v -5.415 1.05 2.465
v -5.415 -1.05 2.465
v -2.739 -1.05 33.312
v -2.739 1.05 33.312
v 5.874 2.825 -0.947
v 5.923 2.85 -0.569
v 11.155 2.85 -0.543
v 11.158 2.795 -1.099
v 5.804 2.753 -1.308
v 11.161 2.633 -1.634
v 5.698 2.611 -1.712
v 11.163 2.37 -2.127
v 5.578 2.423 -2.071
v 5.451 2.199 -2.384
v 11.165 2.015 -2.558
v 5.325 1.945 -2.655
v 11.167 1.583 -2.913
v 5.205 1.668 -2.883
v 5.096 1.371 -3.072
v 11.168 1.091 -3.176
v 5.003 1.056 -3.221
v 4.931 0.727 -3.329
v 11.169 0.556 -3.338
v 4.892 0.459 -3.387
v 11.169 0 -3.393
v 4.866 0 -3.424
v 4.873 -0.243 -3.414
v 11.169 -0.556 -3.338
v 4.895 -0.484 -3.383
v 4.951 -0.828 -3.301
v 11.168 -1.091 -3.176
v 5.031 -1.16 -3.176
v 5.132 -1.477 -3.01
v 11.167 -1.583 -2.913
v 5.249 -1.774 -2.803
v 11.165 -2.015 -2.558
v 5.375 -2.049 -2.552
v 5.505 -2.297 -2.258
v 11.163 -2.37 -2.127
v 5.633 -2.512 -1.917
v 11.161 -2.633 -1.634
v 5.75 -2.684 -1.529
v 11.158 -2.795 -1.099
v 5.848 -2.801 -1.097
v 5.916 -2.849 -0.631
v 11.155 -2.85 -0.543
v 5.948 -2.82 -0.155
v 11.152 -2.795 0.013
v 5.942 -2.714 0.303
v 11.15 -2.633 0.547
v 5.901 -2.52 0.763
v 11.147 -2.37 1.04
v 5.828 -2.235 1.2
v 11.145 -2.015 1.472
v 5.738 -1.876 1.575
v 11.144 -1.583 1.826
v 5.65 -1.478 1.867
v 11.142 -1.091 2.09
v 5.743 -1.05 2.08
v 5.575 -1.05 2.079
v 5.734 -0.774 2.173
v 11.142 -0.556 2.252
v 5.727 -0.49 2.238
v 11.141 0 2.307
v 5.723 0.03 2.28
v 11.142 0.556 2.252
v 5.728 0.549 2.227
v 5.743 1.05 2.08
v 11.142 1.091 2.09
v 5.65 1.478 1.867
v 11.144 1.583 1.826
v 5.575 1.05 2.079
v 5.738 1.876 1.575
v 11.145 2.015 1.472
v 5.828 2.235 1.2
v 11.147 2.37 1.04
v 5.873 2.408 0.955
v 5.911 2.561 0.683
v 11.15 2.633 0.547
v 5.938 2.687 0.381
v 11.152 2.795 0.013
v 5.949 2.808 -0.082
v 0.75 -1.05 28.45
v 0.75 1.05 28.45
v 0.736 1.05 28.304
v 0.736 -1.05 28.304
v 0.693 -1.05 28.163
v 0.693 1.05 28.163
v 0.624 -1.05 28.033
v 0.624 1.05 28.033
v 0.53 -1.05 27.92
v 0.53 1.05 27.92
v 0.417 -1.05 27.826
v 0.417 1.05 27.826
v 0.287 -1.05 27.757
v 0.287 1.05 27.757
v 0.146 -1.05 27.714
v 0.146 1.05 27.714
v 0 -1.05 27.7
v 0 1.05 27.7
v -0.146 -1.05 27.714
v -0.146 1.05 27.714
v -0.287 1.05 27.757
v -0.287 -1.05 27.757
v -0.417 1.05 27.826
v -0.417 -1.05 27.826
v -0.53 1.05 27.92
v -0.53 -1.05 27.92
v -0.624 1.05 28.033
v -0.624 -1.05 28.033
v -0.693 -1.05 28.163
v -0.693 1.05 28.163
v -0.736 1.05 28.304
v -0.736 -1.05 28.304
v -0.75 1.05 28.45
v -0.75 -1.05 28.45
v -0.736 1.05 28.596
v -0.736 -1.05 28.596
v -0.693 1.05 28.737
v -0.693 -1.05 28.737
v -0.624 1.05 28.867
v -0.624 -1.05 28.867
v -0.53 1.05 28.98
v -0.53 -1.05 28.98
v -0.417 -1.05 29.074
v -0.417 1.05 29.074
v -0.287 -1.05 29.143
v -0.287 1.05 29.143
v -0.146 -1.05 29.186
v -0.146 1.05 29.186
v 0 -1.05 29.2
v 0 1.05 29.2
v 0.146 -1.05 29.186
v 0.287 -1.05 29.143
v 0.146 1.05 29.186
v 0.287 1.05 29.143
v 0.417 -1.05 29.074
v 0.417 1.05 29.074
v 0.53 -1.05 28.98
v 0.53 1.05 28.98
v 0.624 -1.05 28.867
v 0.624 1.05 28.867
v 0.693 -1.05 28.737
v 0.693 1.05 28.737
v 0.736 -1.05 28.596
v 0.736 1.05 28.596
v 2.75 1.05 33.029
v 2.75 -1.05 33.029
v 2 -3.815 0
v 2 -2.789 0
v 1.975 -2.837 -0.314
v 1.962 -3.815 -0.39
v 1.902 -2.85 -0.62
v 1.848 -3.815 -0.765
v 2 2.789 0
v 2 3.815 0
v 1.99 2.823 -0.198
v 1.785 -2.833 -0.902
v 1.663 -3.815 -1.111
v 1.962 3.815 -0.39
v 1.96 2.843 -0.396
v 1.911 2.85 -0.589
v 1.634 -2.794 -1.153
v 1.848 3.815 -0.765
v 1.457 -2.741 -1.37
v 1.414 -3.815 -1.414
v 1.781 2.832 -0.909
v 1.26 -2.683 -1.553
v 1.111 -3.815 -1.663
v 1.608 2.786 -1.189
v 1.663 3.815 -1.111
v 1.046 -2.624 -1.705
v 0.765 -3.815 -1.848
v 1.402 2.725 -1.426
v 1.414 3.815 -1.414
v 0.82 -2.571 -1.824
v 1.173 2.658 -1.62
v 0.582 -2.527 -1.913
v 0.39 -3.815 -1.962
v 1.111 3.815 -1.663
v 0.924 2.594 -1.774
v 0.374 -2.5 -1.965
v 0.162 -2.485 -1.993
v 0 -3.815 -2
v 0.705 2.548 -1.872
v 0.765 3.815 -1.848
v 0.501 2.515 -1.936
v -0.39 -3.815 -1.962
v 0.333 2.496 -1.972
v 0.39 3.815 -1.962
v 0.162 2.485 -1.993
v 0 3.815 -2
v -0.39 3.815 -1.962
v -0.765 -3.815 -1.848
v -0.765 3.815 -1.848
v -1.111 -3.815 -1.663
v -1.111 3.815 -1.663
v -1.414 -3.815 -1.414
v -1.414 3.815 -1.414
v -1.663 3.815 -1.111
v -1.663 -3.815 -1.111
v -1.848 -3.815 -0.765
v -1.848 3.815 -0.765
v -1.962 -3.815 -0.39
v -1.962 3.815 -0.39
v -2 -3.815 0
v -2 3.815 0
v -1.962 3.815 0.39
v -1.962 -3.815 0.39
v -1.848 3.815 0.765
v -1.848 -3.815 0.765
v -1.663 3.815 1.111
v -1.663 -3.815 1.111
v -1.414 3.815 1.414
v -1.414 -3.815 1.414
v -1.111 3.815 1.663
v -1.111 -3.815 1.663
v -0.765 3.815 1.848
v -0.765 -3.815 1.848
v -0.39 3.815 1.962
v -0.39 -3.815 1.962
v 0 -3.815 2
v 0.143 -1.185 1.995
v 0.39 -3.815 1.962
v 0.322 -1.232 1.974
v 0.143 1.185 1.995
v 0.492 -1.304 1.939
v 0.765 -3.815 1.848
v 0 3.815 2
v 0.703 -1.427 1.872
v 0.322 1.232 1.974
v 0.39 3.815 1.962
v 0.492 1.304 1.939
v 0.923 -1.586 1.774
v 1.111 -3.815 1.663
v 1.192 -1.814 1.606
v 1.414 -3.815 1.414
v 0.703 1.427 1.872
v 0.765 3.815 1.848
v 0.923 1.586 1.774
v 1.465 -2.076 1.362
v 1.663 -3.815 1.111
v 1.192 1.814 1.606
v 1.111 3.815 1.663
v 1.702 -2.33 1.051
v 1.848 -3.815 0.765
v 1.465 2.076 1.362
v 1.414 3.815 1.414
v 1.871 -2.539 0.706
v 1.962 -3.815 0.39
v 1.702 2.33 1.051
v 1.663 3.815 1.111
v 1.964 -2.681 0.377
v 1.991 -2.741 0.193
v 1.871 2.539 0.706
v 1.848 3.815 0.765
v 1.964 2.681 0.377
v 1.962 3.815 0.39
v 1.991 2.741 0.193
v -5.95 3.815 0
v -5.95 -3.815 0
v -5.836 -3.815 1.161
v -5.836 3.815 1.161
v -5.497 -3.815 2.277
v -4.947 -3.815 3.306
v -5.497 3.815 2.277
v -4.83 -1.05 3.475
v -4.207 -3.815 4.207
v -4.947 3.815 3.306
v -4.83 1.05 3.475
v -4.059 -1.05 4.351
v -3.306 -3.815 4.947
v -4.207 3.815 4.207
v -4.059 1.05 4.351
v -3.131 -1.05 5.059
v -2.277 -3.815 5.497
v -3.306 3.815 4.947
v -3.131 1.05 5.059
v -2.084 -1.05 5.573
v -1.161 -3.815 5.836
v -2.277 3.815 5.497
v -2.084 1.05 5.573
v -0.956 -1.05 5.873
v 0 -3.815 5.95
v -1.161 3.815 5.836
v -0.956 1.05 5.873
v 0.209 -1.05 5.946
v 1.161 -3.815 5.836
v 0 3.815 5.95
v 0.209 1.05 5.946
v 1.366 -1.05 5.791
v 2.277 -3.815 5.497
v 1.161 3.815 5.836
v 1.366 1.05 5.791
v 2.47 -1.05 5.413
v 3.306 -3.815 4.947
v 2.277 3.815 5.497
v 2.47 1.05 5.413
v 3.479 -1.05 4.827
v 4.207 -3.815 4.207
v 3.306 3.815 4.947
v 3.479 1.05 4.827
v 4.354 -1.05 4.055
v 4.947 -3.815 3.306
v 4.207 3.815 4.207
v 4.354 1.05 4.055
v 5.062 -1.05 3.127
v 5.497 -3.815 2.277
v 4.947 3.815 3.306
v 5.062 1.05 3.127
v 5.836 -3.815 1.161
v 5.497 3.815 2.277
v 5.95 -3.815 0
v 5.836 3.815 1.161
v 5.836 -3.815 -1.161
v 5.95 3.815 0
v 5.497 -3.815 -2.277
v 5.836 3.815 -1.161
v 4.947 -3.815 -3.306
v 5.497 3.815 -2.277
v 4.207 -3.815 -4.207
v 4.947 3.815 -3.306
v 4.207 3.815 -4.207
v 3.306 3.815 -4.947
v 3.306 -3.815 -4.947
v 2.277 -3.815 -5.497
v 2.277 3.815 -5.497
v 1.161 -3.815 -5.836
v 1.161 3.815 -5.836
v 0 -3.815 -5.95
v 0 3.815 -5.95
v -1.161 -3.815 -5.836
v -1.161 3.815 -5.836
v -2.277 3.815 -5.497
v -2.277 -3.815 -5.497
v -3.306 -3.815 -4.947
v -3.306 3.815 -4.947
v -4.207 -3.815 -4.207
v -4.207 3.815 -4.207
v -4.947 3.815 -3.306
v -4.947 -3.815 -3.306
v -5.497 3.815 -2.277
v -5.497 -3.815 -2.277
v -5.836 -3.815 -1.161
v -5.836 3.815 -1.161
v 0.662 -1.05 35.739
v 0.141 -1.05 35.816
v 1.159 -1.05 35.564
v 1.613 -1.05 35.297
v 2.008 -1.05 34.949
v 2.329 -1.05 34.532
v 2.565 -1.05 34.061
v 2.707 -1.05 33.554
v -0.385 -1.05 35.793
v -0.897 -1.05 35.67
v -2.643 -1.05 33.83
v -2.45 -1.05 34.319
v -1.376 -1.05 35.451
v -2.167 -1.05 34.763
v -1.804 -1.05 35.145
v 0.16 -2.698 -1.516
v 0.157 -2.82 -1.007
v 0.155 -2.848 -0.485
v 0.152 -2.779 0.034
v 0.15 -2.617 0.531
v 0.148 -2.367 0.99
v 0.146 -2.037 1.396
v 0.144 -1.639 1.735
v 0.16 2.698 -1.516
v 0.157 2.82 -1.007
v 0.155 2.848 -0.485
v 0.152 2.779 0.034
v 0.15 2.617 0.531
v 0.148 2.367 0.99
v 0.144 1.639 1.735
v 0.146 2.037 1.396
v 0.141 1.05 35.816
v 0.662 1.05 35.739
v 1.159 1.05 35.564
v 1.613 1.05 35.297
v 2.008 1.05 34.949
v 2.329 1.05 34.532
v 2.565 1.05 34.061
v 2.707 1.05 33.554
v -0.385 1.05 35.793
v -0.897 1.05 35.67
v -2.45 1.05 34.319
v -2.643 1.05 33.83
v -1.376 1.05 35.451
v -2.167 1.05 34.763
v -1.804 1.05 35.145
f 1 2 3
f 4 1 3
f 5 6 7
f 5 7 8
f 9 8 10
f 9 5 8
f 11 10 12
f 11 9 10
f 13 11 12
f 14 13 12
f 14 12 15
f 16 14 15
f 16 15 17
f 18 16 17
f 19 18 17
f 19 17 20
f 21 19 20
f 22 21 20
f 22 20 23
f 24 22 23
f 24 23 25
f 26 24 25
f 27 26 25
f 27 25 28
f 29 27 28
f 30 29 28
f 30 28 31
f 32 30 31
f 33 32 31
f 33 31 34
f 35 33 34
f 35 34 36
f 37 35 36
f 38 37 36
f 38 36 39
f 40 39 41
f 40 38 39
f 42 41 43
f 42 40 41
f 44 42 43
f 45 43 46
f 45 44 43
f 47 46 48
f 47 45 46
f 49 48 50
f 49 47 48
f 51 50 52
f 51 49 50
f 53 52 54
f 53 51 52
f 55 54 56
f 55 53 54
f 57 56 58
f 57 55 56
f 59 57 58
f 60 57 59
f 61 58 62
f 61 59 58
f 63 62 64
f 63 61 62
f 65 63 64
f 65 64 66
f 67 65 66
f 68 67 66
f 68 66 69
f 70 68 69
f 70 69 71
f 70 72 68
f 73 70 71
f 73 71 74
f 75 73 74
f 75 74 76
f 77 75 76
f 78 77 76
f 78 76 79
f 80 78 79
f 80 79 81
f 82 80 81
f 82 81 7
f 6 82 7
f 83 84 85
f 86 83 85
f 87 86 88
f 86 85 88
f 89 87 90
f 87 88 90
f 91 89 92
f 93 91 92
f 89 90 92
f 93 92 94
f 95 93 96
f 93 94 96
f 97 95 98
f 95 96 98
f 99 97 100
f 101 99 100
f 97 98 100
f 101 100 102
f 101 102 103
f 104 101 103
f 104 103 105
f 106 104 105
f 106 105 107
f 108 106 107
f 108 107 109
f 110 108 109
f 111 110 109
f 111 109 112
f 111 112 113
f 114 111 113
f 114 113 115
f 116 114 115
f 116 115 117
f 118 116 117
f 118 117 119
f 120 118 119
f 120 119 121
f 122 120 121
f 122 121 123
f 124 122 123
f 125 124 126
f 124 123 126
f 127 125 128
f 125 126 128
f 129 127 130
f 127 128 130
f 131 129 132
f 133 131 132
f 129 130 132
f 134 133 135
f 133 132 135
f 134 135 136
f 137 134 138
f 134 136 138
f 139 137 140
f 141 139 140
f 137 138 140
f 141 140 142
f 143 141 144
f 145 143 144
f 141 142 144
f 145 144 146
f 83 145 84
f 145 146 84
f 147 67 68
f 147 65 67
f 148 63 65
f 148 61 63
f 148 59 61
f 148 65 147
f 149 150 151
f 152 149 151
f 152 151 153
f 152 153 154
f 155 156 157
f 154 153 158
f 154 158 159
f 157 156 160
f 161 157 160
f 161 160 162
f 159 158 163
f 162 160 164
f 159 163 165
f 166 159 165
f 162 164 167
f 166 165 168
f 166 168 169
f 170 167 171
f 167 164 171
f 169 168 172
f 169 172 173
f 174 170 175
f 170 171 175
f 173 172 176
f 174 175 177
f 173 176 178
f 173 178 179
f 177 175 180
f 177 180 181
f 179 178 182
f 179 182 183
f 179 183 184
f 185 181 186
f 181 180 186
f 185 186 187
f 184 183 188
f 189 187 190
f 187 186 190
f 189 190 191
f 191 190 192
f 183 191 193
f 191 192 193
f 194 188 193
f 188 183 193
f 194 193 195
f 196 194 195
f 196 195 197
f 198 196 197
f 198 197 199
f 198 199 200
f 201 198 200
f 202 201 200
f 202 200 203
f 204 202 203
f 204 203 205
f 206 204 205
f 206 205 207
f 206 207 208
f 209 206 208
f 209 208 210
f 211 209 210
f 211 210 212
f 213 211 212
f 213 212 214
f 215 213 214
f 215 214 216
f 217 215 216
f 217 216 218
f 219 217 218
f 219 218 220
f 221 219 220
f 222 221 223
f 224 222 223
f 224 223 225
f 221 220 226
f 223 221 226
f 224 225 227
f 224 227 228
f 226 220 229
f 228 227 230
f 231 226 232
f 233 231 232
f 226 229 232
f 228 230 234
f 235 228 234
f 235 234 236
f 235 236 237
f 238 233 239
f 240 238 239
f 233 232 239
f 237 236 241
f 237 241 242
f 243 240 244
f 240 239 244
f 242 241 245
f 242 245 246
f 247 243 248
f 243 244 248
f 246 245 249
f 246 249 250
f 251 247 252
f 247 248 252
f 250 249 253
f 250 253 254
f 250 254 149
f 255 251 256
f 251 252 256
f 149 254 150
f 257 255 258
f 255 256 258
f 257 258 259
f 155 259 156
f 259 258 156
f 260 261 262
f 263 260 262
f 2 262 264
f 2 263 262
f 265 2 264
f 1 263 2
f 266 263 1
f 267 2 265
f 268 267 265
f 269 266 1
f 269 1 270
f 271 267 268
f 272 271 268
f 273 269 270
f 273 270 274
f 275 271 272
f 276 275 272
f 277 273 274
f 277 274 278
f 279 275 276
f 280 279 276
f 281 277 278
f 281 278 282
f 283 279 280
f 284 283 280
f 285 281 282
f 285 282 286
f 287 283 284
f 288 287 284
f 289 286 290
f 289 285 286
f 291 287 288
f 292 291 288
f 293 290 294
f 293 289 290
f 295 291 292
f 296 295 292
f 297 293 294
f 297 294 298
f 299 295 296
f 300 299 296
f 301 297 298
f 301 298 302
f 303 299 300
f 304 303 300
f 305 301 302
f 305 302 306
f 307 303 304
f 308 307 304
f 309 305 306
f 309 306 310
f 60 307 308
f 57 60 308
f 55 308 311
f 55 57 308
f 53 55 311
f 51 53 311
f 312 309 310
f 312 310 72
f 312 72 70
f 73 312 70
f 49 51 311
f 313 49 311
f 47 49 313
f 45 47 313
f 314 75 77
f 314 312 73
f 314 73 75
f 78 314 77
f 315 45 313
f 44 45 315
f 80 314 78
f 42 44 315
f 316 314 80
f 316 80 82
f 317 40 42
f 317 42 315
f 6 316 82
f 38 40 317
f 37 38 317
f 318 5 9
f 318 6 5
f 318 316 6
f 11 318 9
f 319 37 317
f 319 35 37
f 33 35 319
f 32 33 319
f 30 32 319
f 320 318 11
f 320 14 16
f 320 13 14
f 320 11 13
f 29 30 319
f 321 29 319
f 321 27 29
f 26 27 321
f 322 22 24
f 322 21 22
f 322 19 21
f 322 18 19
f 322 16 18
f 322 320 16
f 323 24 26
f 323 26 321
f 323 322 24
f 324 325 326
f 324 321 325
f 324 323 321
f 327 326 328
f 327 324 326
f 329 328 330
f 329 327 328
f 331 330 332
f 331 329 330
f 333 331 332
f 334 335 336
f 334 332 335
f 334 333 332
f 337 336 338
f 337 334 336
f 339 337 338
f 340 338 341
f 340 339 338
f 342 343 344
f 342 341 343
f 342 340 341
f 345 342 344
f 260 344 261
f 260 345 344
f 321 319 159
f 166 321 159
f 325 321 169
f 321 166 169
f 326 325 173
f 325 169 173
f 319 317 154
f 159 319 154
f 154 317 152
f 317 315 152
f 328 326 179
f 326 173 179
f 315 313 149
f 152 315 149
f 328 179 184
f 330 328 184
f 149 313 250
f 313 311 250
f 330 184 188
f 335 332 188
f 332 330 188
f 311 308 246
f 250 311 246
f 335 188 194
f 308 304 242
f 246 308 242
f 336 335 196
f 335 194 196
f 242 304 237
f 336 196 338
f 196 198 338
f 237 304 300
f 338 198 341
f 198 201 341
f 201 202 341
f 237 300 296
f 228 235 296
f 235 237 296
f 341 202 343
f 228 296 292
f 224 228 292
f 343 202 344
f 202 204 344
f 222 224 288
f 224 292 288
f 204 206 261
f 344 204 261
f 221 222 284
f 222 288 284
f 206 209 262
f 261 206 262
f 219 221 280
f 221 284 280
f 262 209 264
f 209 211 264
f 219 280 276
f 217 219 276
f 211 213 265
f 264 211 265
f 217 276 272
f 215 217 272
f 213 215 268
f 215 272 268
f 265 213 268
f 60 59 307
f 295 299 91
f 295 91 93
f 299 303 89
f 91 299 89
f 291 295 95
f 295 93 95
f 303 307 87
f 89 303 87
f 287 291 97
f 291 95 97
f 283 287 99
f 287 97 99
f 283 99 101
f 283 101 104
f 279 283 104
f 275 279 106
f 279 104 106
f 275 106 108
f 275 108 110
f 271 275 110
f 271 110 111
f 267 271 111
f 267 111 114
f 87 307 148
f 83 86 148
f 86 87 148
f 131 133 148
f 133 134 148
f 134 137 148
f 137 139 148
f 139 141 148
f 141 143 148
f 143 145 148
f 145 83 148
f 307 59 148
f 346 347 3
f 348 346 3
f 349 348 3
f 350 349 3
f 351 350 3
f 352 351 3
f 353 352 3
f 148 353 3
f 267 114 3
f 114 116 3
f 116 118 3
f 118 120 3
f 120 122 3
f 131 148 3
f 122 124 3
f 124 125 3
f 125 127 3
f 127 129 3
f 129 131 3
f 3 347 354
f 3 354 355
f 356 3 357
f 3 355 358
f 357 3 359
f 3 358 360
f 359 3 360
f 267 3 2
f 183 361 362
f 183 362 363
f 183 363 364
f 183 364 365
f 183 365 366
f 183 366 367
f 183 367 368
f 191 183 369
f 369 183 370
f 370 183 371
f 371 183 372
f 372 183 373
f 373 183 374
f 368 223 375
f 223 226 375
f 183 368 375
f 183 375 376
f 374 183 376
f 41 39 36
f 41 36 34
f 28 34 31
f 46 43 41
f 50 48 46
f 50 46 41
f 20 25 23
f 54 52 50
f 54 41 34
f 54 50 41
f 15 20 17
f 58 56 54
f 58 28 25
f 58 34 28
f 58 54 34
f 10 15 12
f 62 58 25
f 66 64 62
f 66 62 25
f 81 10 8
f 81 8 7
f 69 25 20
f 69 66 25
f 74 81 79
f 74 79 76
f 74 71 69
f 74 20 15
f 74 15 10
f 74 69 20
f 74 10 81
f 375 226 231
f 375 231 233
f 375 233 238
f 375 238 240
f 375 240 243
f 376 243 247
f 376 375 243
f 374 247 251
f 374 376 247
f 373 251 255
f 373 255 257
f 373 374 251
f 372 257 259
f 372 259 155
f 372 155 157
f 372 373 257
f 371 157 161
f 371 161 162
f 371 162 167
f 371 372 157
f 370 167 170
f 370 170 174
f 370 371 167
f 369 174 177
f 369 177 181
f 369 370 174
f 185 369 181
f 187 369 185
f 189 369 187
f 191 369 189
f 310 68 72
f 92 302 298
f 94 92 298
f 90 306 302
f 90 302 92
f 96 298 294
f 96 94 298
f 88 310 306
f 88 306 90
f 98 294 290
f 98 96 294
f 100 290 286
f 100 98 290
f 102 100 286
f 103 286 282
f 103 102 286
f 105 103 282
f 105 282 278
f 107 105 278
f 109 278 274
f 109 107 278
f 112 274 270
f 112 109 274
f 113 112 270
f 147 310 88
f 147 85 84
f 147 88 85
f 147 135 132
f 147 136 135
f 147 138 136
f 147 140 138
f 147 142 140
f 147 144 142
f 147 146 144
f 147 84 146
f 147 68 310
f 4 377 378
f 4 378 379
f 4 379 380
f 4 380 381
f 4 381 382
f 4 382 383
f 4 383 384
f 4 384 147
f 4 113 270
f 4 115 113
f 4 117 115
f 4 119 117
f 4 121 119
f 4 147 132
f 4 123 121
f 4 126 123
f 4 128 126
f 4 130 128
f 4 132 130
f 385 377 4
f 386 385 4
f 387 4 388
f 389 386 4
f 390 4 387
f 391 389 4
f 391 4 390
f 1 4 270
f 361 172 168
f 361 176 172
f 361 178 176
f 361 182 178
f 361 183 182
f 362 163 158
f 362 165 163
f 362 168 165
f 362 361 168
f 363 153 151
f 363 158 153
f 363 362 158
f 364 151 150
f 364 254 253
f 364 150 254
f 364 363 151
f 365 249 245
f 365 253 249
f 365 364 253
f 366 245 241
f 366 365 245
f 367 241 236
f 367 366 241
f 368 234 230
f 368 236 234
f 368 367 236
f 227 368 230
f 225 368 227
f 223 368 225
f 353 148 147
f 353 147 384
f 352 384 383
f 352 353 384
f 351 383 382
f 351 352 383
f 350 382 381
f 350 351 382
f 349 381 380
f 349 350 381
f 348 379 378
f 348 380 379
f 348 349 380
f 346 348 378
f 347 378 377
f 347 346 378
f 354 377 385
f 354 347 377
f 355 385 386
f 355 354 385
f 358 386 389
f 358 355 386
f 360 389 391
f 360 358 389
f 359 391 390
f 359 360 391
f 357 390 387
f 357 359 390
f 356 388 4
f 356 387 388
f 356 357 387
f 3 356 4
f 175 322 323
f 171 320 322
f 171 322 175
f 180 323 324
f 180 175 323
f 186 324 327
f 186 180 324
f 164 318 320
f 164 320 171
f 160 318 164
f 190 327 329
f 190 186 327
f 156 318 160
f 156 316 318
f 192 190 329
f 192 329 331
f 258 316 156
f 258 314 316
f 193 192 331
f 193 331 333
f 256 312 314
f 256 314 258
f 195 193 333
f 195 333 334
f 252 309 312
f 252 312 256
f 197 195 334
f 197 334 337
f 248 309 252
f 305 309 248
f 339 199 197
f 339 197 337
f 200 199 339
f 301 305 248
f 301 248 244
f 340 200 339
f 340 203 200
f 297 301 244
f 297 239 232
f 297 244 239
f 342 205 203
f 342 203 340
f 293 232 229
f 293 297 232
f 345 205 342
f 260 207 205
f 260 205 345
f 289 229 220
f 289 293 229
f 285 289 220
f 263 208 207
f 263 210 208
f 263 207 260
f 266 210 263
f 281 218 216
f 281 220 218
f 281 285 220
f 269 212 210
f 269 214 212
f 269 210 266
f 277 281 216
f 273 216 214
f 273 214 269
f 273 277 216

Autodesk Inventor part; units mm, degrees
ref_plane "YZ Plane" through (0, 0, 0) normal (1, 0, 0) x (0, 1, 0)
ref_plane "XZ Plane" through (0, 0, 0) normal (0, 1, 0) x (-1, 0, 0)
sketch "Sketch1" plane through (0, 0, 0) normal (0, 1, 0) x (-1, 0, 0)
  circle A0 centre (0, 0) radius 5.95
  line L0 (0, 0) -> (0, 33.07)
  circle A1 centre (0, 33.07) radius 2.75
  line L1 (5.4153, 2.4652) -> (2.7393, 33.3118)
  line L2 (-5.8278, 1.1997) -> (-2.7497, 33.029)
  dimension "d0" = 11.9
  dimension "d1" = 5.5
  dimension "d2" = 33.07
extrude "Extrusion1" add sketch "Sketch1" along normal mid plane 7.63 contours A0
extrude "Extrusion2" add sketch "Sketch1" along normal mid plane 2.1 contours A0 L0 A1 L1 | L2 A1 L0 A0 | A1
sketch "Sketch2" plane through (0, 1.05, 0) normal (0, 1, 0) x (1, 0, 0)
  arc A0 (-2.7393, -33.3118) -> (2.7497, -33.029) centre (0, -33.07) ccw construction
  line L0 (0, -35.82) -> (0, -28.45) construction
  circle A1 centre (0, -28.45) radius 0.75
  point P0 (0, 0)
  dimension "d7" = 7.37
  dimension "d8" = 1.5
extrude "Extrusion3" cut sketch "Sketch2" against normal blind 2.1
sketch "Sketch3" plane through (0, 3.815, 0) normal (0, 1, 0) x (1, 0, 0)
  circle A0 centre (0, 0) radius 2
  point P0 (0, 0)
  dimension "d11" = 4
extrude "Extrusion4" cut sketch "Sketch3" against normal blind 50
ref_plane "Work Plane1" through (-0.1567, -1.05, 63.0829) normal (1, 0, 0.0049) x (0, 1, 0)
sketch "Sketch4" plane through (-0.1567, -1.05, 63.0829) normal (1, 0, 0.0049) x (0, 1, 0)
  circle A0 centre (1.05, -63.6808) radius 2.85
  point P0 (1.05, -63.0829)
  dimension "d14" = 5.7
extrude "Extrusion5" add sketch "Sketch4" along normal blind 11
properties part number "Nose Gear Steering Arm"
